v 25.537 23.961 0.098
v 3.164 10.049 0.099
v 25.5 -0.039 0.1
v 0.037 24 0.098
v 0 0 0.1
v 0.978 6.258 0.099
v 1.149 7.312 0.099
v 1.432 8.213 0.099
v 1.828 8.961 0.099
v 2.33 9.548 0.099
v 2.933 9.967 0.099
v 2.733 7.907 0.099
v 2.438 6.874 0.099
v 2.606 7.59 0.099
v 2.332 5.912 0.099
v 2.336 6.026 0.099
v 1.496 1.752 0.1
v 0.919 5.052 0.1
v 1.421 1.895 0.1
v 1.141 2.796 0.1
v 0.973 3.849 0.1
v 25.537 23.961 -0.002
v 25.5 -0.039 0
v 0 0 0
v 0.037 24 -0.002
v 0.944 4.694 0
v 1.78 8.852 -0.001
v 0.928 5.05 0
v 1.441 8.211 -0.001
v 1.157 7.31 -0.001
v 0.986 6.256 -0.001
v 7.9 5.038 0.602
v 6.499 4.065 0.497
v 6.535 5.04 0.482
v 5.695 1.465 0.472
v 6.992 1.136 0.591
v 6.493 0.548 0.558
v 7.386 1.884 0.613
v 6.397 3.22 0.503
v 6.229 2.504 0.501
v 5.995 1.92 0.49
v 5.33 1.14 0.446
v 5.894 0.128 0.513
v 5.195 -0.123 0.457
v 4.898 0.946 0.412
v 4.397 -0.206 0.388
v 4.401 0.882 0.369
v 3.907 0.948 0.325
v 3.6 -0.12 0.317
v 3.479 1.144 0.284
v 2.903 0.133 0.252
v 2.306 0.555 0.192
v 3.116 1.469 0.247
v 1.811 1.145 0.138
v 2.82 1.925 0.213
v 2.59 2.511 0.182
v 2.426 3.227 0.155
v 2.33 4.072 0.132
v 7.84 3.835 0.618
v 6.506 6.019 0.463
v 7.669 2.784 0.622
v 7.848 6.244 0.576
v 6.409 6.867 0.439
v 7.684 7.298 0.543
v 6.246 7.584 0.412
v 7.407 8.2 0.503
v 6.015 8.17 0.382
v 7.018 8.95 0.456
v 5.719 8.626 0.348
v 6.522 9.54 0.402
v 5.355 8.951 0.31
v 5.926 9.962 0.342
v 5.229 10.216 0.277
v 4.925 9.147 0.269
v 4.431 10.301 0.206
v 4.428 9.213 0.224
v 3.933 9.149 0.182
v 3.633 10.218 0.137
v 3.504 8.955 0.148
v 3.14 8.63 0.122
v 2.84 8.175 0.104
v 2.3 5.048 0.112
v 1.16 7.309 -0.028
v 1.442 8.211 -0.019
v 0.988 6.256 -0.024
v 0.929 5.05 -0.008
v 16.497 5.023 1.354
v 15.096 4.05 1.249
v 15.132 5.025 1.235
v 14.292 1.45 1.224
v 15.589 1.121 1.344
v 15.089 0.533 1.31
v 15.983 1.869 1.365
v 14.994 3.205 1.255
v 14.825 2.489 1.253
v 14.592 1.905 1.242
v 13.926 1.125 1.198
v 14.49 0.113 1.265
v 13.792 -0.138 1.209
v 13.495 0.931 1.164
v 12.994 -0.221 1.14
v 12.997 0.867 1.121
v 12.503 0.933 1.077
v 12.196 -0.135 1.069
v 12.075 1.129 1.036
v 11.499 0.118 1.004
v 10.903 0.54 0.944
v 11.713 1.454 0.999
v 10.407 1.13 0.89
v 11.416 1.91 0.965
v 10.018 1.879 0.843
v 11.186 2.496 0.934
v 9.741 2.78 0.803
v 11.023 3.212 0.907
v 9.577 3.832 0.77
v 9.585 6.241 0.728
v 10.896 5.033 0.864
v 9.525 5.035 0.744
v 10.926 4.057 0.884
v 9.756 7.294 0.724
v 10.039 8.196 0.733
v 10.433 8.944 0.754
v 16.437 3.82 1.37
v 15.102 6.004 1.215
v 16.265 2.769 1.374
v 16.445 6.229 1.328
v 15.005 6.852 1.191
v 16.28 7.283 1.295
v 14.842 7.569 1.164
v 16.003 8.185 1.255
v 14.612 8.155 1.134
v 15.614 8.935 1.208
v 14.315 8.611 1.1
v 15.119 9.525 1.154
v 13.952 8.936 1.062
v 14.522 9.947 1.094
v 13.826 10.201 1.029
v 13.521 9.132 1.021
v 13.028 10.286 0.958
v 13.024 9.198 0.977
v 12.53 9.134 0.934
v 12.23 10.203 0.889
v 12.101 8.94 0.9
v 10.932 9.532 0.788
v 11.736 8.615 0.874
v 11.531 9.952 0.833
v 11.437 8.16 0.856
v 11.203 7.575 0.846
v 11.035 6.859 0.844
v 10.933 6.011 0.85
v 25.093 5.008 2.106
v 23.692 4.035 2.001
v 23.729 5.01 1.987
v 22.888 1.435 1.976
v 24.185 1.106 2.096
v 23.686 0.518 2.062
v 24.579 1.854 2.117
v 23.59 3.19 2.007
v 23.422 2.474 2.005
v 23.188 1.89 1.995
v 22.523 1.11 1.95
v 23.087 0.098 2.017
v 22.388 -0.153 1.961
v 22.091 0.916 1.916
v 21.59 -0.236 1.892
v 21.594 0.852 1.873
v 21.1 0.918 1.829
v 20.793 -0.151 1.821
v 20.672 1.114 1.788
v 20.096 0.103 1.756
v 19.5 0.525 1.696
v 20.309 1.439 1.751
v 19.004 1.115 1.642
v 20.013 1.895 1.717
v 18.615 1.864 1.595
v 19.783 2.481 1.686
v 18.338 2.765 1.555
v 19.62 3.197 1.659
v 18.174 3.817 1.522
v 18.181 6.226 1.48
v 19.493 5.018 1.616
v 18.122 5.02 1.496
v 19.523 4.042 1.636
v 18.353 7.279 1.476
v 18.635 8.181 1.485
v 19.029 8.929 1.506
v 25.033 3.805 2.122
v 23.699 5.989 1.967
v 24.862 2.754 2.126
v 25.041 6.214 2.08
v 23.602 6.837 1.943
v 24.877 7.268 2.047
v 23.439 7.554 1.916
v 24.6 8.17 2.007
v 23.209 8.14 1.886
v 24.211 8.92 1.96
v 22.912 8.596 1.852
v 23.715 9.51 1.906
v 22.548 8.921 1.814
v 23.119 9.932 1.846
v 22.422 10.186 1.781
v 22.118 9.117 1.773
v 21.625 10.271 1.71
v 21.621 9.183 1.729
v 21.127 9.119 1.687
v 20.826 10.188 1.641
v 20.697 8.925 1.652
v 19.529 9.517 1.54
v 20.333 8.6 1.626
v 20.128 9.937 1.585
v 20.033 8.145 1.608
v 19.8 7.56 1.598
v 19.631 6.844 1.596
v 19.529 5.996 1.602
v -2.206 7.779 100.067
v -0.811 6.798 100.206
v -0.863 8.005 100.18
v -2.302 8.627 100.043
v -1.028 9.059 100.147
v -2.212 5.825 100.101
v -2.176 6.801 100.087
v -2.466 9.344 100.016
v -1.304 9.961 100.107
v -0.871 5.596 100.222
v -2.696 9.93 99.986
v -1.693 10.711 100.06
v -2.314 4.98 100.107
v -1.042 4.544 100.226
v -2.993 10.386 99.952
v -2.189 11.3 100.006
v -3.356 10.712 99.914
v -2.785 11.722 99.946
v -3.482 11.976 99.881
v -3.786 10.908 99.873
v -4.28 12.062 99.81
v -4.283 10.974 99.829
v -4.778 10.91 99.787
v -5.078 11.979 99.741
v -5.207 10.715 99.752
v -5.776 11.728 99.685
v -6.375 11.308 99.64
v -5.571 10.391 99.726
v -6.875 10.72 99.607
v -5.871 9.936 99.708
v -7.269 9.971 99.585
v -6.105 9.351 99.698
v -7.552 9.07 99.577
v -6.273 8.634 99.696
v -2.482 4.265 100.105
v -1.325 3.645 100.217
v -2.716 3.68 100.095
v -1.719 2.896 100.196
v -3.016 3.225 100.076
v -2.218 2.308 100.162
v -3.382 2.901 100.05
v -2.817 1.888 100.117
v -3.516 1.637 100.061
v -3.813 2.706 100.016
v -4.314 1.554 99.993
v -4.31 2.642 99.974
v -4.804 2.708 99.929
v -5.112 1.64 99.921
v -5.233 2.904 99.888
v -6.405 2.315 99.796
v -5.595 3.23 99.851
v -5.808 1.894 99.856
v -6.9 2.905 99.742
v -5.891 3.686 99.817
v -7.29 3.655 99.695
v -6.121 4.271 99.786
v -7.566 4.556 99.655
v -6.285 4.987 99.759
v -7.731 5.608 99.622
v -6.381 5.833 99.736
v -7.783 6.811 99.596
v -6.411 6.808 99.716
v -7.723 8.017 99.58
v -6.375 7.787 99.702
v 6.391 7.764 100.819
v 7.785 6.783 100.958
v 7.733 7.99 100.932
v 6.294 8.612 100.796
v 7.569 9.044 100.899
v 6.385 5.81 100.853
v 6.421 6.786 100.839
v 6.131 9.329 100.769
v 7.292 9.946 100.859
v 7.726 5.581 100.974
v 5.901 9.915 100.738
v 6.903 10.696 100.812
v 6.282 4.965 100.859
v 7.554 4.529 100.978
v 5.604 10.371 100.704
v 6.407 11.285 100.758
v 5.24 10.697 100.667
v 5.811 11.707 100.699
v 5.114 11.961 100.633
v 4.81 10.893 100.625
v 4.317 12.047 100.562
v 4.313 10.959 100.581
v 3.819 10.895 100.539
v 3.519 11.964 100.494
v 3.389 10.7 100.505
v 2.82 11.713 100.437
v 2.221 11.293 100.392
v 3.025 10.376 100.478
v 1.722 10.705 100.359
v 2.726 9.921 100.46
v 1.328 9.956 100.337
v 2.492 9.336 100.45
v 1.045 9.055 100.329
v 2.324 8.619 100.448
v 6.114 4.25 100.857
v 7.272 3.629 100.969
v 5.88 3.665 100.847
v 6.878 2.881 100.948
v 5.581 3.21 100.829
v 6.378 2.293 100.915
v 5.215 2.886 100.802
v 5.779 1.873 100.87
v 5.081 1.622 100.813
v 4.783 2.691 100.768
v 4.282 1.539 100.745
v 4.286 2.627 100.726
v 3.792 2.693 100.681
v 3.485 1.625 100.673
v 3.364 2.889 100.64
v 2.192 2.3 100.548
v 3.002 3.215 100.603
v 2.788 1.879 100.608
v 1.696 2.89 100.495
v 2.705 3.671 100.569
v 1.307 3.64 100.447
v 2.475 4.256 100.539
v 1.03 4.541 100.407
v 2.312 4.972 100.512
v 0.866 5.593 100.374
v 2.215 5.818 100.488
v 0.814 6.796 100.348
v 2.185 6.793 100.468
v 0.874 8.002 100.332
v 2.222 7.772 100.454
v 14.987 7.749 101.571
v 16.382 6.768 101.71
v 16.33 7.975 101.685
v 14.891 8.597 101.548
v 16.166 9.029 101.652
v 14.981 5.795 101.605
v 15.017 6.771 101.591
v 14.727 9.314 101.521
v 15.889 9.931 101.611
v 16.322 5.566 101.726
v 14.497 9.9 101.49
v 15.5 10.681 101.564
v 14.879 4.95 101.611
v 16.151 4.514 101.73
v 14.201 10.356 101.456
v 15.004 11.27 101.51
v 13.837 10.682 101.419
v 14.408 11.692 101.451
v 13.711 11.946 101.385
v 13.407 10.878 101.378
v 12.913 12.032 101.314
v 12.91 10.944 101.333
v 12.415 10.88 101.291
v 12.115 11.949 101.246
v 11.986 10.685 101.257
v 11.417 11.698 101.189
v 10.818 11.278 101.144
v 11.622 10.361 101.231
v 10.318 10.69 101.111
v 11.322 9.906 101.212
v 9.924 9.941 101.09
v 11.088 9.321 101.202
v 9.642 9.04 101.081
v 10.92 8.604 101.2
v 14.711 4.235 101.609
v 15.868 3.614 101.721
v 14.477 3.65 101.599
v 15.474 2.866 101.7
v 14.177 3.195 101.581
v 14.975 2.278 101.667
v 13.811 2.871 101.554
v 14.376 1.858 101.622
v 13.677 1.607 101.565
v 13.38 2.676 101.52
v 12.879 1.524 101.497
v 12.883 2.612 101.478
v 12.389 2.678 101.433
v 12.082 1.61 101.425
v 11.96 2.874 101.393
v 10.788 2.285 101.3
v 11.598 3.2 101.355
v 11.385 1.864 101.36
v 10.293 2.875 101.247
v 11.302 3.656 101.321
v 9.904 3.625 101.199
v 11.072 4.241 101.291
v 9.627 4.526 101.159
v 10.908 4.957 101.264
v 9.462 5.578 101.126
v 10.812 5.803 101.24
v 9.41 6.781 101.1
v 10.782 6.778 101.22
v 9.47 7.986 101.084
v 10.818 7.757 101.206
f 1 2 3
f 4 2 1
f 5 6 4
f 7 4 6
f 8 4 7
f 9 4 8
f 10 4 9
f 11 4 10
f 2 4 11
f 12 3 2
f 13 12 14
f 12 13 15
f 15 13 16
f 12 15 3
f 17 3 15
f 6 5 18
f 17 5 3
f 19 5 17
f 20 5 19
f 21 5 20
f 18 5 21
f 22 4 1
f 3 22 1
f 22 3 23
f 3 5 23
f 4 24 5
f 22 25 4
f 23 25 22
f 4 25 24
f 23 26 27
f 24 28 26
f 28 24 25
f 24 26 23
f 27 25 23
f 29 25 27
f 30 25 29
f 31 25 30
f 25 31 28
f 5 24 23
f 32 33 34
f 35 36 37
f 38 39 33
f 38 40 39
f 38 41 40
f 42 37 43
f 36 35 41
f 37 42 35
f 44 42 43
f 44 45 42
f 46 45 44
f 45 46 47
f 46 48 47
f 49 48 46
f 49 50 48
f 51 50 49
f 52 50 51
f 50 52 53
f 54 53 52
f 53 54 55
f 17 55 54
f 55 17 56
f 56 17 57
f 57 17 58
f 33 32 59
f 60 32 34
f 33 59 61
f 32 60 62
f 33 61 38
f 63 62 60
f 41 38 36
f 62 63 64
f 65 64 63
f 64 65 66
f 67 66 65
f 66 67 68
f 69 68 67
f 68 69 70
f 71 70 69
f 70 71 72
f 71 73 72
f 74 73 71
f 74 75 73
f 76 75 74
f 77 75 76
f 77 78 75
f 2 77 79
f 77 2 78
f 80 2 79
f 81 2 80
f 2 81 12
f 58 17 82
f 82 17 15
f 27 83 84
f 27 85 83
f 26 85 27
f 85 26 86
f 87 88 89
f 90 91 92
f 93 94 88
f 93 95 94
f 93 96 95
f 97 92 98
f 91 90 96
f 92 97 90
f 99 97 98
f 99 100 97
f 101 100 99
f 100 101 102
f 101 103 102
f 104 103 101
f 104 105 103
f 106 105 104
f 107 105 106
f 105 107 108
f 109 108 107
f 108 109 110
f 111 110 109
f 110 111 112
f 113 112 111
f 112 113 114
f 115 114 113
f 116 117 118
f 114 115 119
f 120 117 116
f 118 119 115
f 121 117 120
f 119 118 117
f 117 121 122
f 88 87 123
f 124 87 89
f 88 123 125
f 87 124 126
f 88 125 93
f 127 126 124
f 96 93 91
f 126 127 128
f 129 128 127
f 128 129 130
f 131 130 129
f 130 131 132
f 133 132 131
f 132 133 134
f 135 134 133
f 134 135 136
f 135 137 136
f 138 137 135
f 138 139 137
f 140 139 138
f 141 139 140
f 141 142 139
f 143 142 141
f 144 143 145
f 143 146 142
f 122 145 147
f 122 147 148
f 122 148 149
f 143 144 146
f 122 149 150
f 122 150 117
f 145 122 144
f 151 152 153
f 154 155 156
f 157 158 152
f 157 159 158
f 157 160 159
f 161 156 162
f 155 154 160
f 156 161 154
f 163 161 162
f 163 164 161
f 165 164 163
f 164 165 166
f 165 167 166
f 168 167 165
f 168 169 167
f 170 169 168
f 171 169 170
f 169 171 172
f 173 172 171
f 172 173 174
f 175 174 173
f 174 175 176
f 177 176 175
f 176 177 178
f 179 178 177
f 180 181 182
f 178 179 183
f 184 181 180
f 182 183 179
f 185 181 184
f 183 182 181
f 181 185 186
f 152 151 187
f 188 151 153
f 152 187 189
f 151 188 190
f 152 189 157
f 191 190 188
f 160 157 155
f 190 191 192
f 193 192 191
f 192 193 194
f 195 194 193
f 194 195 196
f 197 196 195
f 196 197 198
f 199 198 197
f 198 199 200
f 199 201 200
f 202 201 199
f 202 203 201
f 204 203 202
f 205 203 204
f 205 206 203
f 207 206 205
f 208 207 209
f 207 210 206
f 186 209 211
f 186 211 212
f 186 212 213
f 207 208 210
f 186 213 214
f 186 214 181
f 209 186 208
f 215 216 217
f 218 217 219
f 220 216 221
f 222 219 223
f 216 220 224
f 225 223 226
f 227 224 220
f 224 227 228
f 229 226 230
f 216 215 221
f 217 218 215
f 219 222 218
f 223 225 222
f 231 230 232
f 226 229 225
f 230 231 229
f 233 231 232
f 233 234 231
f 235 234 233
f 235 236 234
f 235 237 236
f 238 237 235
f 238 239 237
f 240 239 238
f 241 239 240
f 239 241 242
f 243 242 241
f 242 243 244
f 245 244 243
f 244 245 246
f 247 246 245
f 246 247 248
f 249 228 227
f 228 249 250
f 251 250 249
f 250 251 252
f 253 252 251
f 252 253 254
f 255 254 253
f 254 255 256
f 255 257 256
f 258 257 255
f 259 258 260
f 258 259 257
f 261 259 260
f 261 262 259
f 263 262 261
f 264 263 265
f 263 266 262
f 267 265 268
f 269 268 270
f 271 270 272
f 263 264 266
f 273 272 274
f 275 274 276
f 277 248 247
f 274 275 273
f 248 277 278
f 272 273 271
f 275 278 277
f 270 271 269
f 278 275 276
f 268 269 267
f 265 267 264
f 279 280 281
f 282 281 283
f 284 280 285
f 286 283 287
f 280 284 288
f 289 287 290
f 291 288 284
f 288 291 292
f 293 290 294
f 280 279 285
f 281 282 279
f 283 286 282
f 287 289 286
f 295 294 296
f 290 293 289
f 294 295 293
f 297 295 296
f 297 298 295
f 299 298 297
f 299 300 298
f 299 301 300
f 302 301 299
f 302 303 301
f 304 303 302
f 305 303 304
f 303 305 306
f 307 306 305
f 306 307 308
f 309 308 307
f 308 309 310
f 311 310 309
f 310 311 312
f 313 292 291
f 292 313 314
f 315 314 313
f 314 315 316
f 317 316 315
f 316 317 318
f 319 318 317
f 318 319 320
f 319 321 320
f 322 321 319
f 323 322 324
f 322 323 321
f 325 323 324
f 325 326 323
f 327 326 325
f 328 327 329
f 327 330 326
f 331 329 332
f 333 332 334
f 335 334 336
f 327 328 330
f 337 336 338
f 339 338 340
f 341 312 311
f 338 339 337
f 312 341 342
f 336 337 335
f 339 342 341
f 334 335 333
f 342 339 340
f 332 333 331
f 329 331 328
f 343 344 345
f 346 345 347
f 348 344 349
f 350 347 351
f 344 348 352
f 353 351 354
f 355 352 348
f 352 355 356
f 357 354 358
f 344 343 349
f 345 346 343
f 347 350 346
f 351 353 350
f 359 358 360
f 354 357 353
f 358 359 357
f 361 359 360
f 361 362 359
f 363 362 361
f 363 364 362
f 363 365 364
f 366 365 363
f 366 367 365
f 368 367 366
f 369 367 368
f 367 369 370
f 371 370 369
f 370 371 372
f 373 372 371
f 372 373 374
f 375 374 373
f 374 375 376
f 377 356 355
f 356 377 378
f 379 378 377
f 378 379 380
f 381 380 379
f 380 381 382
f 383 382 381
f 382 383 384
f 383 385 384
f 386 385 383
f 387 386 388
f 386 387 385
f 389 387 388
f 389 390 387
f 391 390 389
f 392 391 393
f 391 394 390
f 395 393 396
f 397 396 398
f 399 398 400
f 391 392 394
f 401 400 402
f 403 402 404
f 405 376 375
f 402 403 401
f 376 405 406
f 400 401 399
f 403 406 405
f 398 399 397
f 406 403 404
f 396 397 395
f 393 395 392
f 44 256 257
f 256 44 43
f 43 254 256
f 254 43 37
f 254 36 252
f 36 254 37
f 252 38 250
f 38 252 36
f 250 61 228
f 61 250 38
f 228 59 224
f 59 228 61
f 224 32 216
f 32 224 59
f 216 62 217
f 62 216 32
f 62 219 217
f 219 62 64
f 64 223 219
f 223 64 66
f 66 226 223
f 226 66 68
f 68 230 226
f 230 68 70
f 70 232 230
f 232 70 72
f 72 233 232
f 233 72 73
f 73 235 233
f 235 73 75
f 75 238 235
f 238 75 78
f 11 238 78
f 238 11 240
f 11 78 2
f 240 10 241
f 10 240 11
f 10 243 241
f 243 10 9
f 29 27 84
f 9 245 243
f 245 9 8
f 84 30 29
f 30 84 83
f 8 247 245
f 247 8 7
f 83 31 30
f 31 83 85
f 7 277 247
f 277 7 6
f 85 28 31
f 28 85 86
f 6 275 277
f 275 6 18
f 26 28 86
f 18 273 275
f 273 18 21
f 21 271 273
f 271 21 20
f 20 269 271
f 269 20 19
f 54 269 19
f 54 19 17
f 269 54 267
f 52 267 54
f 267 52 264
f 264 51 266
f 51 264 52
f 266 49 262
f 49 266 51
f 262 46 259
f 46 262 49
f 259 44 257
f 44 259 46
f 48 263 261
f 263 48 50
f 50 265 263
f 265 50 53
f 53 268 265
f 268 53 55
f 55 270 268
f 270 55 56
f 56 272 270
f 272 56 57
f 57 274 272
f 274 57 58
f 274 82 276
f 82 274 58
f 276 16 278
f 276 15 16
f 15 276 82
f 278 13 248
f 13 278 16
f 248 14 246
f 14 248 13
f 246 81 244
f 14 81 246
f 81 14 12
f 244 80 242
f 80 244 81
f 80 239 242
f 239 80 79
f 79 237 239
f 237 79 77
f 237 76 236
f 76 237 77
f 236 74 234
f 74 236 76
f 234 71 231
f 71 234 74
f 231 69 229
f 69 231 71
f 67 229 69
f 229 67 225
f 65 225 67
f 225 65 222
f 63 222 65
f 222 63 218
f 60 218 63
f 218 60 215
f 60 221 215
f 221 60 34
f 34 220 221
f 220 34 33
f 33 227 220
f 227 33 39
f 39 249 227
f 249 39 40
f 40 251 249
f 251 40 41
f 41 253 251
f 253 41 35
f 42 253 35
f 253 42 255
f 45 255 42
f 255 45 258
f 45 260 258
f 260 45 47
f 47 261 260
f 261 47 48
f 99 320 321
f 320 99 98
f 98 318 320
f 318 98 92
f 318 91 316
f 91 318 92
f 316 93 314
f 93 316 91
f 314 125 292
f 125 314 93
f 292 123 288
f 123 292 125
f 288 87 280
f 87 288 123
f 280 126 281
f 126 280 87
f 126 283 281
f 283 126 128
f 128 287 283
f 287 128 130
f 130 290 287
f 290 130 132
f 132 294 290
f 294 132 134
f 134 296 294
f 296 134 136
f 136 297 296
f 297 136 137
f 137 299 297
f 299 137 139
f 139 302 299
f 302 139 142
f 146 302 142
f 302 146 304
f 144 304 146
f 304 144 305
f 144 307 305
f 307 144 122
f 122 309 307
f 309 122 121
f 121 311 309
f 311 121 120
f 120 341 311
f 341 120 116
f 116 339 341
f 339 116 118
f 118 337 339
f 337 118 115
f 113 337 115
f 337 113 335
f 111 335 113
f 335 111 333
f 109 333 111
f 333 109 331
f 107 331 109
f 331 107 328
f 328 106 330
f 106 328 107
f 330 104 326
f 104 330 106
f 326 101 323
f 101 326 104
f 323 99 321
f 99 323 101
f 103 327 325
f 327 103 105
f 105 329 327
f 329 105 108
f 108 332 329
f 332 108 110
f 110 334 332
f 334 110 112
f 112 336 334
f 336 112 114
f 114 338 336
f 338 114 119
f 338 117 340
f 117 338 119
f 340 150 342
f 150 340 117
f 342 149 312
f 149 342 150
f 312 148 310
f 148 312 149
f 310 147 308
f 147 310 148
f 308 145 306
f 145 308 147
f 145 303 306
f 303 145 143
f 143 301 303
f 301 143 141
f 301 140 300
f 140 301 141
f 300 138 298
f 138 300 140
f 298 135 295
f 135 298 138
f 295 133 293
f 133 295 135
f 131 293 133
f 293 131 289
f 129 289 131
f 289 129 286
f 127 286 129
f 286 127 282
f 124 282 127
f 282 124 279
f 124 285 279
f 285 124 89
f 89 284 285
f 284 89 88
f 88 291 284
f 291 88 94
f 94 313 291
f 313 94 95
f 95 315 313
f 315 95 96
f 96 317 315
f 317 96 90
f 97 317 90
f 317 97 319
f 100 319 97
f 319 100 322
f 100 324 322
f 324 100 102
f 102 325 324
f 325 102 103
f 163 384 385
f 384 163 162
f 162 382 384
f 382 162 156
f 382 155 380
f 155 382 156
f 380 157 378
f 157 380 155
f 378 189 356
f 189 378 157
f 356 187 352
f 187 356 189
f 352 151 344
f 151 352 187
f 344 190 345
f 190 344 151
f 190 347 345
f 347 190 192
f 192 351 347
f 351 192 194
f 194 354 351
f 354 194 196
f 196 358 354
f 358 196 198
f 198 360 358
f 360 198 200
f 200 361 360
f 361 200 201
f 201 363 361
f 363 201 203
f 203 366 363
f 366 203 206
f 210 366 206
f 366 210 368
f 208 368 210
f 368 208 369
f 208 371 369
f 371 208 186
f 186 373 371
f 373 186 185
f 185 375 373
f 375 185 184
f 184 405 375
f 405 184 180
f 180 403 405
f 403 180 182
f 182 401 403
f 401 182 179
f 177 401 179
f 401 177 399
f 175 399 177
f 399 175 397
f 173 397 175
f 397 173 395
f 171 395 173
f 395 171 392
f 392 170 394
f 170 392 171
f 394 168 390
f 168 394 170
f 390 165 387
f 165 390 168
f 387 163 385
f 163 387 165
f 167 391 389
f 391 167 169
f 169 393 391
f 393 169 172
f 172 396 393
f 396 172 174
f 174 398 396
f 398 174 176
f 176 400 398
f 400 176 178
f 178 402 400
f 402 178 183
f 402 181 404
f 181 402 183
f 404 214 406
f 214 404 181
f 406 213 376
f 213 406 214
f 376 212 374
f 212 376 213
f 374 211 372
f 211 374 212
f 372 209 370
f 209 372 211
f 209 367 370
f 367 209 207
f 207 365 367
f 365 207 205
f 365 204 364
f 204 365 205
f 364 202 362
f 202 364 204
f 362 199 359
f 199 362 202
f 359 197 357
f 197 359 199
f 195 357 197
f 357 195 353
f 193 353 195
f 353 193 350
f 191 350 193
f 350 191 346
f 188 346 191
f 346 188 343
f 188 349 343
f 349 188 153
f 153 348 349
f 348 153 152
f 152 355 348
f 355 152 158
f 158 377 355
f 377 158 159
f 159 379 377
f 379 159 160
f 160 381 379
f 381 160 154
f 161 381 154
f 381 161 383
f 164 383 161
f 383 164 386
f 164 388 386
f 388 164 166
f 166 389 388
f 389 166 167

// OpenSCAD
// file: ../common/library_function.scad
// 라이브러리, 검증된 것만 이곳에
use <MCAD/boxes.scad>
include	<constants.scad>

// 적정한 fn 값
function fnRound(radious) = $preview ? FN : floor(2 * PI * radious / 0.4) - floor(2 * PI * radious / 0.4) % 4;
//function fnRound(radious) = 2 * PI * radious / 0.4;

// z축 0로로
function set_z(v, z) = [v.x, v.y, z];

// 벡터 회전 계산
function rotate_vector(angle, vector) = rotatez_vector(angle[2], rotatey_vector(angle[1], rotatex_vector(angle[0], vector)));
// x축 기준 회전 벡터 회전 계산
function rotatex_vector(anglex, vector) = [
	vector[0],
	-vector[2] * sin(anglex) + vector[1] * cos(anglex),
	vector[2] * cos(anglex) + vector[1] * sin(anglex)
];
// y축 기준 회전 벡터 회전 계산
function rotatey_vector(angley, vector) = [
	vector[0] * cos(angley) + vector[2] * sin(angley),
	vector[1],
	-vector[0] * sin(angley) + vector[2] * cos(angley)
];

// z축 기준 회전 벡터 회전 계산
function rotatez_vector(anglez, vector) = [
	-vector[1] * sin(anglez) + vector[0] * cos(anglez),
	vector[1] * cos(anglez) + vector[0] * sin(anglez),
	vector[2]
];

//	숫자, 소수점 이하 몇자리
function strfix(number, count) =
	chr([for (cx = [0:
		len(search(".", str(number))) == 0
			? len(str(number)) - 1
			: (search(".", str(number))[0] + count) >= len(str(number))
				? len(str(number)) - 1
				: (search(".", str(number))[0] + count)
	]) ord(str(number)[cx])])
;

//	육면체에서 꼭지점들을 벡터로
function	vectors_from_cube(size) = [
	[0,			0,		0],
	[size.x,	0,		0],
	[size.x,	size.y,	0],
	[0,			size.y,	0],

	[0,			0,		size.z],
	[size.x,	0,		size.z],
	[size.x,	size.y,	size.z],
	[0,			size.y,	size.z]
];
// file: common.scad
include	<../common/constants.scad>

// map에서 못찾으면 default에서 찾는다
function get(map, key, default) = let(
	result = search([key], map, 1, 0),
	spare = search([key], default, 1, 0)
)	len(result) > 0	? map[result[0]][1] : len(spare) > 0 ? map[default[0]][1] : "";

// A(x0, y0), B(x1, y1), C(x2, y2) 에서 A와 직선 BC 사이 거리 계산
function pointToLineDistance(x0, y0, x1, y1, x2, y2) =
    abs((x2 - x1)*(y1 - y0) - (x1 - x0)*(y2 - y1)) /
    sqrt((x2 - x1)*(x2 - x1) + (y2 - y1)*(y2 - y1));

module hr() {
	echo(HR);
}
module arrow_left(v) {
	leader = v.y / 32;	//	지시선 두께
	polygon([
		[0, 0],
		[leader, 0],
		[leader, v.y],
		[0, v.y]
	]);

	shaft = v.y / 24;	//	화살대 두께
	polygon([
		[0,		v.y / 2],
		[v.y,	0],
		[v.y,	v.y / 2 - shaft],
		[v.y,	v.y / 2 + shaft],
		[v.y,	v.y],

		[v.x,	v.y / 2 - shaft],
		[v.x,	v.y / 2 + shaft]
	],
	paths=[[0, 1, 2, 5, 6, 3, 4]]);
}
module arrow_right(v) {
	translate(v)
	rotate([0, 0, 180])
	arrow_left(v);
}
module arrow_up(v) {
	translate([0, v.y])
	rotate([0, 0, -90])
	arrow_left([v.y, v.x]);
}
module arrow_down(v) {
	translate([v.x, 0])
	rotate([0, 0, 90])
	arrow_left([v.y, v.x]);
}

module notateHI(v, title) {
	titleSize = v.y * len(title);

	arrow_left([(v.x - titleSize) / 2, v.y]);

	translate([v.x - (v.x - titleSize) / 2, 0])
	arrow_right([(v.x - titleSize) / 2, v.y]);

	translate([v.x / 2, 0])
	text(title, font = "D2Coding", size = v.y, halign = "center");
}
module notateHO(v, title) {
	titleSize = v.y * len(title);
	arrowSize = v.y * 3;

	translate([-arrowSize, 0])
	arrow_right([arrowSize, v.y]);

	translate([v.x, 0])
	arrow_left([arrowSize, v.y]);

	translate([v.x / 2, 0])
	text(title, font = "D2Coding", size = v.y, halign = "center");
}
module notateH(v, title, up, prefix) {
	prefixSafe = is_undef(prefix) ? "" : prefix;
	titleDetail = is_undef(title) ? str(prefixSafe, v.x, "mm") : title;
	titleShort = is_undef(title) ? str(prefixSafe, v.x) : title;
	titleDetailSize = v.y * len(titleDetail);
	titleShortSize = v.y * len(titleShort);
	
	arrowSize = v.y * 3;

	titleSafe = is_undef(title) ? str(v.x) : title;
	upSafe = is_undef(up) ? true : false;
	%linear_extrude(height = EPSILON) {
		if (v.x >= (arrowSize * 2 + titleDetailSize)) {
			// 화살표, 단위까지 충분히 들어간다
			notateHI(v, titleDetail);
		} else if (v.x >= (arrowSize * 2 + titleShortSize)) {
			// 화살표는 들어갈 수 있으나, 단위까지는 못 들어간다
			notateHI(v, titleShort);
		} else if (v.x >= titleDetailSize) {
			//	화살표는 못들어가나, 단위는 들어간다
			notateHO(v, titleDetail);
		} else if (v.x >= titleShortSize) {
			//	화살표는 못들어가나, 수치는 들어간다
			notateHO(v, titleShort);
		} else {
			// 바깥에 표시해야 한다
			notateHO(v, "");
			if (upSafe) {
				translate([v.x / 2, v.y])
				text(titleDetail, font = "D2Coding", size = v.y, halign = "center");
			} else {
				translate([v.x / 2, -v.y])
				text(titleDetail, font = "D2Coding", size = v.y, halign = "center");
			}
		}
	}
}
module notateV(v, title, up, prefix) {
	translate([v.x, 0])
	rotate([0, 0, 90])
	notateH([v.y, v.x], title, up, prefix);
}
module notate(v, title, up, prefix) {
//	echo(str(parent_module(0), ".", parent_module(1), "(", v, title, up, prefix, ")"));

	assert(!is_undef(v));
	assert(!is_undef(v[1]));

	if (v.x > v.y) {
		notateH(v, title, up, prefix);
	} else {
		notateV(v, title, up, prefix);
	}
}
module test() {
	// 테스트
	x0 = 2; y0 = 2;    // 점 A
	x1 = 0; y1 = 0;    // 점 B
	x2 = 4; y2 = 0;    // 점 C

	distance = pointToLineDistance(x0, y0, x1, y1, x2, y2);
	hr();
	echo("A에서 BC까지의 거리: ", distance);
	hr();
}
module main() {
	SHORT = 20;
	//notate([32, 16], str(32, "mm"));
	//notateH([3, 4]);
	notate([13, 4]);
	arrow_left([8, 2]);

	test();
}

main();
// file: ../common/constants.scad
// 상수들 정의
// include 사용하시오
MAX = [220, 220, 250];
ZERO = [0, 0, 0];
HALF = [1/2, 1/2, 1/2];
ONE = [1, 1, 1];
BIG = [1024, 1024, 1024];
EPSILON = 0.01;
EPSILON2 = EPSILON * 2;
MINIMUM = 0.1;	//	0.1mm
NOZZLE = 0.4;	//	노즐 지름
OVERHANG_THRESHOLD = 30;
HR = "──────────────────────────────────";
DIGIT = "①②③④⑤⑥⑦⑧⑨⑩⑪⑫⑬⑭⑮⑯⑰⑱⑲⑳";
UPPER = "ⒶⒷⒸⒹⒺⒻⒼⒽⒾⒿⓀⓁⓂⓃⓄⓅⓆⓇⓈⓉⓊⓋⓌⓍⓎⓏ";
LOWER = "ⓐⓑⓒⓓⓔⓕⓖⓗⓘⓙⓚⓛⓜⓝⓞⓟⓠⓡⓢⓣⓤⓥⓦⓧⓨⓩ";

FN = $preview ? 16 : 360;

//	자원들
RADIUS_HOLE_NUT_25 = 3.4 / 2;	//	검은색 25mm 나사 너트 구멍 반지름
// main file
include	<../common/constants.scad>
use	<../common/library_text.scad>
use <common.scad>

COLOR = [0.4, 0.8, 0.4, 0.5];
DEFAULT = [
	["display.connector",			"디스플레이 패널에 붙어있는 커넥터, displayConnector, part03"],
	["display.connector.size",		[25.50, 24.00, 0.1],			"크기, sizeDisplayConnector"],
	["display.connector.margin",	[72.35, 0, 0],					"디스플레이 패널로부터의 상대적인 위치,여백, marginDisplayConnector"],
	["reserved", "끝"]
];
function default03() = DEFAULT;

module epaper_part03(map = DEFAULT) {
	echo(str(parent_module(0), ".", parent_module(1), "(", map, ")"));

	assert(!is_undef(map));

	sizeDisplayConnector = get(map, "display.connector.size", DEFAULT);
	marginDisplayConnector = get(map, "display.connector.margin", DEFAULT);
	description = str(parent_module(0), "\ndisplay.connector", "\ndisplay.connector.size: ", sizeDisplayConnector, "\ndisplay.connector.margin: ", marginDisplayConnector);

	carve([0, 0, 0], [1, 5, sizeDisplayConnector.z], 0.01, true) {
		color(COLOR)
		cube(sizeDisplayConnector);

		text0(description, 0.7);
	}
}

module main() {
	epaper_part03();
}

main();
